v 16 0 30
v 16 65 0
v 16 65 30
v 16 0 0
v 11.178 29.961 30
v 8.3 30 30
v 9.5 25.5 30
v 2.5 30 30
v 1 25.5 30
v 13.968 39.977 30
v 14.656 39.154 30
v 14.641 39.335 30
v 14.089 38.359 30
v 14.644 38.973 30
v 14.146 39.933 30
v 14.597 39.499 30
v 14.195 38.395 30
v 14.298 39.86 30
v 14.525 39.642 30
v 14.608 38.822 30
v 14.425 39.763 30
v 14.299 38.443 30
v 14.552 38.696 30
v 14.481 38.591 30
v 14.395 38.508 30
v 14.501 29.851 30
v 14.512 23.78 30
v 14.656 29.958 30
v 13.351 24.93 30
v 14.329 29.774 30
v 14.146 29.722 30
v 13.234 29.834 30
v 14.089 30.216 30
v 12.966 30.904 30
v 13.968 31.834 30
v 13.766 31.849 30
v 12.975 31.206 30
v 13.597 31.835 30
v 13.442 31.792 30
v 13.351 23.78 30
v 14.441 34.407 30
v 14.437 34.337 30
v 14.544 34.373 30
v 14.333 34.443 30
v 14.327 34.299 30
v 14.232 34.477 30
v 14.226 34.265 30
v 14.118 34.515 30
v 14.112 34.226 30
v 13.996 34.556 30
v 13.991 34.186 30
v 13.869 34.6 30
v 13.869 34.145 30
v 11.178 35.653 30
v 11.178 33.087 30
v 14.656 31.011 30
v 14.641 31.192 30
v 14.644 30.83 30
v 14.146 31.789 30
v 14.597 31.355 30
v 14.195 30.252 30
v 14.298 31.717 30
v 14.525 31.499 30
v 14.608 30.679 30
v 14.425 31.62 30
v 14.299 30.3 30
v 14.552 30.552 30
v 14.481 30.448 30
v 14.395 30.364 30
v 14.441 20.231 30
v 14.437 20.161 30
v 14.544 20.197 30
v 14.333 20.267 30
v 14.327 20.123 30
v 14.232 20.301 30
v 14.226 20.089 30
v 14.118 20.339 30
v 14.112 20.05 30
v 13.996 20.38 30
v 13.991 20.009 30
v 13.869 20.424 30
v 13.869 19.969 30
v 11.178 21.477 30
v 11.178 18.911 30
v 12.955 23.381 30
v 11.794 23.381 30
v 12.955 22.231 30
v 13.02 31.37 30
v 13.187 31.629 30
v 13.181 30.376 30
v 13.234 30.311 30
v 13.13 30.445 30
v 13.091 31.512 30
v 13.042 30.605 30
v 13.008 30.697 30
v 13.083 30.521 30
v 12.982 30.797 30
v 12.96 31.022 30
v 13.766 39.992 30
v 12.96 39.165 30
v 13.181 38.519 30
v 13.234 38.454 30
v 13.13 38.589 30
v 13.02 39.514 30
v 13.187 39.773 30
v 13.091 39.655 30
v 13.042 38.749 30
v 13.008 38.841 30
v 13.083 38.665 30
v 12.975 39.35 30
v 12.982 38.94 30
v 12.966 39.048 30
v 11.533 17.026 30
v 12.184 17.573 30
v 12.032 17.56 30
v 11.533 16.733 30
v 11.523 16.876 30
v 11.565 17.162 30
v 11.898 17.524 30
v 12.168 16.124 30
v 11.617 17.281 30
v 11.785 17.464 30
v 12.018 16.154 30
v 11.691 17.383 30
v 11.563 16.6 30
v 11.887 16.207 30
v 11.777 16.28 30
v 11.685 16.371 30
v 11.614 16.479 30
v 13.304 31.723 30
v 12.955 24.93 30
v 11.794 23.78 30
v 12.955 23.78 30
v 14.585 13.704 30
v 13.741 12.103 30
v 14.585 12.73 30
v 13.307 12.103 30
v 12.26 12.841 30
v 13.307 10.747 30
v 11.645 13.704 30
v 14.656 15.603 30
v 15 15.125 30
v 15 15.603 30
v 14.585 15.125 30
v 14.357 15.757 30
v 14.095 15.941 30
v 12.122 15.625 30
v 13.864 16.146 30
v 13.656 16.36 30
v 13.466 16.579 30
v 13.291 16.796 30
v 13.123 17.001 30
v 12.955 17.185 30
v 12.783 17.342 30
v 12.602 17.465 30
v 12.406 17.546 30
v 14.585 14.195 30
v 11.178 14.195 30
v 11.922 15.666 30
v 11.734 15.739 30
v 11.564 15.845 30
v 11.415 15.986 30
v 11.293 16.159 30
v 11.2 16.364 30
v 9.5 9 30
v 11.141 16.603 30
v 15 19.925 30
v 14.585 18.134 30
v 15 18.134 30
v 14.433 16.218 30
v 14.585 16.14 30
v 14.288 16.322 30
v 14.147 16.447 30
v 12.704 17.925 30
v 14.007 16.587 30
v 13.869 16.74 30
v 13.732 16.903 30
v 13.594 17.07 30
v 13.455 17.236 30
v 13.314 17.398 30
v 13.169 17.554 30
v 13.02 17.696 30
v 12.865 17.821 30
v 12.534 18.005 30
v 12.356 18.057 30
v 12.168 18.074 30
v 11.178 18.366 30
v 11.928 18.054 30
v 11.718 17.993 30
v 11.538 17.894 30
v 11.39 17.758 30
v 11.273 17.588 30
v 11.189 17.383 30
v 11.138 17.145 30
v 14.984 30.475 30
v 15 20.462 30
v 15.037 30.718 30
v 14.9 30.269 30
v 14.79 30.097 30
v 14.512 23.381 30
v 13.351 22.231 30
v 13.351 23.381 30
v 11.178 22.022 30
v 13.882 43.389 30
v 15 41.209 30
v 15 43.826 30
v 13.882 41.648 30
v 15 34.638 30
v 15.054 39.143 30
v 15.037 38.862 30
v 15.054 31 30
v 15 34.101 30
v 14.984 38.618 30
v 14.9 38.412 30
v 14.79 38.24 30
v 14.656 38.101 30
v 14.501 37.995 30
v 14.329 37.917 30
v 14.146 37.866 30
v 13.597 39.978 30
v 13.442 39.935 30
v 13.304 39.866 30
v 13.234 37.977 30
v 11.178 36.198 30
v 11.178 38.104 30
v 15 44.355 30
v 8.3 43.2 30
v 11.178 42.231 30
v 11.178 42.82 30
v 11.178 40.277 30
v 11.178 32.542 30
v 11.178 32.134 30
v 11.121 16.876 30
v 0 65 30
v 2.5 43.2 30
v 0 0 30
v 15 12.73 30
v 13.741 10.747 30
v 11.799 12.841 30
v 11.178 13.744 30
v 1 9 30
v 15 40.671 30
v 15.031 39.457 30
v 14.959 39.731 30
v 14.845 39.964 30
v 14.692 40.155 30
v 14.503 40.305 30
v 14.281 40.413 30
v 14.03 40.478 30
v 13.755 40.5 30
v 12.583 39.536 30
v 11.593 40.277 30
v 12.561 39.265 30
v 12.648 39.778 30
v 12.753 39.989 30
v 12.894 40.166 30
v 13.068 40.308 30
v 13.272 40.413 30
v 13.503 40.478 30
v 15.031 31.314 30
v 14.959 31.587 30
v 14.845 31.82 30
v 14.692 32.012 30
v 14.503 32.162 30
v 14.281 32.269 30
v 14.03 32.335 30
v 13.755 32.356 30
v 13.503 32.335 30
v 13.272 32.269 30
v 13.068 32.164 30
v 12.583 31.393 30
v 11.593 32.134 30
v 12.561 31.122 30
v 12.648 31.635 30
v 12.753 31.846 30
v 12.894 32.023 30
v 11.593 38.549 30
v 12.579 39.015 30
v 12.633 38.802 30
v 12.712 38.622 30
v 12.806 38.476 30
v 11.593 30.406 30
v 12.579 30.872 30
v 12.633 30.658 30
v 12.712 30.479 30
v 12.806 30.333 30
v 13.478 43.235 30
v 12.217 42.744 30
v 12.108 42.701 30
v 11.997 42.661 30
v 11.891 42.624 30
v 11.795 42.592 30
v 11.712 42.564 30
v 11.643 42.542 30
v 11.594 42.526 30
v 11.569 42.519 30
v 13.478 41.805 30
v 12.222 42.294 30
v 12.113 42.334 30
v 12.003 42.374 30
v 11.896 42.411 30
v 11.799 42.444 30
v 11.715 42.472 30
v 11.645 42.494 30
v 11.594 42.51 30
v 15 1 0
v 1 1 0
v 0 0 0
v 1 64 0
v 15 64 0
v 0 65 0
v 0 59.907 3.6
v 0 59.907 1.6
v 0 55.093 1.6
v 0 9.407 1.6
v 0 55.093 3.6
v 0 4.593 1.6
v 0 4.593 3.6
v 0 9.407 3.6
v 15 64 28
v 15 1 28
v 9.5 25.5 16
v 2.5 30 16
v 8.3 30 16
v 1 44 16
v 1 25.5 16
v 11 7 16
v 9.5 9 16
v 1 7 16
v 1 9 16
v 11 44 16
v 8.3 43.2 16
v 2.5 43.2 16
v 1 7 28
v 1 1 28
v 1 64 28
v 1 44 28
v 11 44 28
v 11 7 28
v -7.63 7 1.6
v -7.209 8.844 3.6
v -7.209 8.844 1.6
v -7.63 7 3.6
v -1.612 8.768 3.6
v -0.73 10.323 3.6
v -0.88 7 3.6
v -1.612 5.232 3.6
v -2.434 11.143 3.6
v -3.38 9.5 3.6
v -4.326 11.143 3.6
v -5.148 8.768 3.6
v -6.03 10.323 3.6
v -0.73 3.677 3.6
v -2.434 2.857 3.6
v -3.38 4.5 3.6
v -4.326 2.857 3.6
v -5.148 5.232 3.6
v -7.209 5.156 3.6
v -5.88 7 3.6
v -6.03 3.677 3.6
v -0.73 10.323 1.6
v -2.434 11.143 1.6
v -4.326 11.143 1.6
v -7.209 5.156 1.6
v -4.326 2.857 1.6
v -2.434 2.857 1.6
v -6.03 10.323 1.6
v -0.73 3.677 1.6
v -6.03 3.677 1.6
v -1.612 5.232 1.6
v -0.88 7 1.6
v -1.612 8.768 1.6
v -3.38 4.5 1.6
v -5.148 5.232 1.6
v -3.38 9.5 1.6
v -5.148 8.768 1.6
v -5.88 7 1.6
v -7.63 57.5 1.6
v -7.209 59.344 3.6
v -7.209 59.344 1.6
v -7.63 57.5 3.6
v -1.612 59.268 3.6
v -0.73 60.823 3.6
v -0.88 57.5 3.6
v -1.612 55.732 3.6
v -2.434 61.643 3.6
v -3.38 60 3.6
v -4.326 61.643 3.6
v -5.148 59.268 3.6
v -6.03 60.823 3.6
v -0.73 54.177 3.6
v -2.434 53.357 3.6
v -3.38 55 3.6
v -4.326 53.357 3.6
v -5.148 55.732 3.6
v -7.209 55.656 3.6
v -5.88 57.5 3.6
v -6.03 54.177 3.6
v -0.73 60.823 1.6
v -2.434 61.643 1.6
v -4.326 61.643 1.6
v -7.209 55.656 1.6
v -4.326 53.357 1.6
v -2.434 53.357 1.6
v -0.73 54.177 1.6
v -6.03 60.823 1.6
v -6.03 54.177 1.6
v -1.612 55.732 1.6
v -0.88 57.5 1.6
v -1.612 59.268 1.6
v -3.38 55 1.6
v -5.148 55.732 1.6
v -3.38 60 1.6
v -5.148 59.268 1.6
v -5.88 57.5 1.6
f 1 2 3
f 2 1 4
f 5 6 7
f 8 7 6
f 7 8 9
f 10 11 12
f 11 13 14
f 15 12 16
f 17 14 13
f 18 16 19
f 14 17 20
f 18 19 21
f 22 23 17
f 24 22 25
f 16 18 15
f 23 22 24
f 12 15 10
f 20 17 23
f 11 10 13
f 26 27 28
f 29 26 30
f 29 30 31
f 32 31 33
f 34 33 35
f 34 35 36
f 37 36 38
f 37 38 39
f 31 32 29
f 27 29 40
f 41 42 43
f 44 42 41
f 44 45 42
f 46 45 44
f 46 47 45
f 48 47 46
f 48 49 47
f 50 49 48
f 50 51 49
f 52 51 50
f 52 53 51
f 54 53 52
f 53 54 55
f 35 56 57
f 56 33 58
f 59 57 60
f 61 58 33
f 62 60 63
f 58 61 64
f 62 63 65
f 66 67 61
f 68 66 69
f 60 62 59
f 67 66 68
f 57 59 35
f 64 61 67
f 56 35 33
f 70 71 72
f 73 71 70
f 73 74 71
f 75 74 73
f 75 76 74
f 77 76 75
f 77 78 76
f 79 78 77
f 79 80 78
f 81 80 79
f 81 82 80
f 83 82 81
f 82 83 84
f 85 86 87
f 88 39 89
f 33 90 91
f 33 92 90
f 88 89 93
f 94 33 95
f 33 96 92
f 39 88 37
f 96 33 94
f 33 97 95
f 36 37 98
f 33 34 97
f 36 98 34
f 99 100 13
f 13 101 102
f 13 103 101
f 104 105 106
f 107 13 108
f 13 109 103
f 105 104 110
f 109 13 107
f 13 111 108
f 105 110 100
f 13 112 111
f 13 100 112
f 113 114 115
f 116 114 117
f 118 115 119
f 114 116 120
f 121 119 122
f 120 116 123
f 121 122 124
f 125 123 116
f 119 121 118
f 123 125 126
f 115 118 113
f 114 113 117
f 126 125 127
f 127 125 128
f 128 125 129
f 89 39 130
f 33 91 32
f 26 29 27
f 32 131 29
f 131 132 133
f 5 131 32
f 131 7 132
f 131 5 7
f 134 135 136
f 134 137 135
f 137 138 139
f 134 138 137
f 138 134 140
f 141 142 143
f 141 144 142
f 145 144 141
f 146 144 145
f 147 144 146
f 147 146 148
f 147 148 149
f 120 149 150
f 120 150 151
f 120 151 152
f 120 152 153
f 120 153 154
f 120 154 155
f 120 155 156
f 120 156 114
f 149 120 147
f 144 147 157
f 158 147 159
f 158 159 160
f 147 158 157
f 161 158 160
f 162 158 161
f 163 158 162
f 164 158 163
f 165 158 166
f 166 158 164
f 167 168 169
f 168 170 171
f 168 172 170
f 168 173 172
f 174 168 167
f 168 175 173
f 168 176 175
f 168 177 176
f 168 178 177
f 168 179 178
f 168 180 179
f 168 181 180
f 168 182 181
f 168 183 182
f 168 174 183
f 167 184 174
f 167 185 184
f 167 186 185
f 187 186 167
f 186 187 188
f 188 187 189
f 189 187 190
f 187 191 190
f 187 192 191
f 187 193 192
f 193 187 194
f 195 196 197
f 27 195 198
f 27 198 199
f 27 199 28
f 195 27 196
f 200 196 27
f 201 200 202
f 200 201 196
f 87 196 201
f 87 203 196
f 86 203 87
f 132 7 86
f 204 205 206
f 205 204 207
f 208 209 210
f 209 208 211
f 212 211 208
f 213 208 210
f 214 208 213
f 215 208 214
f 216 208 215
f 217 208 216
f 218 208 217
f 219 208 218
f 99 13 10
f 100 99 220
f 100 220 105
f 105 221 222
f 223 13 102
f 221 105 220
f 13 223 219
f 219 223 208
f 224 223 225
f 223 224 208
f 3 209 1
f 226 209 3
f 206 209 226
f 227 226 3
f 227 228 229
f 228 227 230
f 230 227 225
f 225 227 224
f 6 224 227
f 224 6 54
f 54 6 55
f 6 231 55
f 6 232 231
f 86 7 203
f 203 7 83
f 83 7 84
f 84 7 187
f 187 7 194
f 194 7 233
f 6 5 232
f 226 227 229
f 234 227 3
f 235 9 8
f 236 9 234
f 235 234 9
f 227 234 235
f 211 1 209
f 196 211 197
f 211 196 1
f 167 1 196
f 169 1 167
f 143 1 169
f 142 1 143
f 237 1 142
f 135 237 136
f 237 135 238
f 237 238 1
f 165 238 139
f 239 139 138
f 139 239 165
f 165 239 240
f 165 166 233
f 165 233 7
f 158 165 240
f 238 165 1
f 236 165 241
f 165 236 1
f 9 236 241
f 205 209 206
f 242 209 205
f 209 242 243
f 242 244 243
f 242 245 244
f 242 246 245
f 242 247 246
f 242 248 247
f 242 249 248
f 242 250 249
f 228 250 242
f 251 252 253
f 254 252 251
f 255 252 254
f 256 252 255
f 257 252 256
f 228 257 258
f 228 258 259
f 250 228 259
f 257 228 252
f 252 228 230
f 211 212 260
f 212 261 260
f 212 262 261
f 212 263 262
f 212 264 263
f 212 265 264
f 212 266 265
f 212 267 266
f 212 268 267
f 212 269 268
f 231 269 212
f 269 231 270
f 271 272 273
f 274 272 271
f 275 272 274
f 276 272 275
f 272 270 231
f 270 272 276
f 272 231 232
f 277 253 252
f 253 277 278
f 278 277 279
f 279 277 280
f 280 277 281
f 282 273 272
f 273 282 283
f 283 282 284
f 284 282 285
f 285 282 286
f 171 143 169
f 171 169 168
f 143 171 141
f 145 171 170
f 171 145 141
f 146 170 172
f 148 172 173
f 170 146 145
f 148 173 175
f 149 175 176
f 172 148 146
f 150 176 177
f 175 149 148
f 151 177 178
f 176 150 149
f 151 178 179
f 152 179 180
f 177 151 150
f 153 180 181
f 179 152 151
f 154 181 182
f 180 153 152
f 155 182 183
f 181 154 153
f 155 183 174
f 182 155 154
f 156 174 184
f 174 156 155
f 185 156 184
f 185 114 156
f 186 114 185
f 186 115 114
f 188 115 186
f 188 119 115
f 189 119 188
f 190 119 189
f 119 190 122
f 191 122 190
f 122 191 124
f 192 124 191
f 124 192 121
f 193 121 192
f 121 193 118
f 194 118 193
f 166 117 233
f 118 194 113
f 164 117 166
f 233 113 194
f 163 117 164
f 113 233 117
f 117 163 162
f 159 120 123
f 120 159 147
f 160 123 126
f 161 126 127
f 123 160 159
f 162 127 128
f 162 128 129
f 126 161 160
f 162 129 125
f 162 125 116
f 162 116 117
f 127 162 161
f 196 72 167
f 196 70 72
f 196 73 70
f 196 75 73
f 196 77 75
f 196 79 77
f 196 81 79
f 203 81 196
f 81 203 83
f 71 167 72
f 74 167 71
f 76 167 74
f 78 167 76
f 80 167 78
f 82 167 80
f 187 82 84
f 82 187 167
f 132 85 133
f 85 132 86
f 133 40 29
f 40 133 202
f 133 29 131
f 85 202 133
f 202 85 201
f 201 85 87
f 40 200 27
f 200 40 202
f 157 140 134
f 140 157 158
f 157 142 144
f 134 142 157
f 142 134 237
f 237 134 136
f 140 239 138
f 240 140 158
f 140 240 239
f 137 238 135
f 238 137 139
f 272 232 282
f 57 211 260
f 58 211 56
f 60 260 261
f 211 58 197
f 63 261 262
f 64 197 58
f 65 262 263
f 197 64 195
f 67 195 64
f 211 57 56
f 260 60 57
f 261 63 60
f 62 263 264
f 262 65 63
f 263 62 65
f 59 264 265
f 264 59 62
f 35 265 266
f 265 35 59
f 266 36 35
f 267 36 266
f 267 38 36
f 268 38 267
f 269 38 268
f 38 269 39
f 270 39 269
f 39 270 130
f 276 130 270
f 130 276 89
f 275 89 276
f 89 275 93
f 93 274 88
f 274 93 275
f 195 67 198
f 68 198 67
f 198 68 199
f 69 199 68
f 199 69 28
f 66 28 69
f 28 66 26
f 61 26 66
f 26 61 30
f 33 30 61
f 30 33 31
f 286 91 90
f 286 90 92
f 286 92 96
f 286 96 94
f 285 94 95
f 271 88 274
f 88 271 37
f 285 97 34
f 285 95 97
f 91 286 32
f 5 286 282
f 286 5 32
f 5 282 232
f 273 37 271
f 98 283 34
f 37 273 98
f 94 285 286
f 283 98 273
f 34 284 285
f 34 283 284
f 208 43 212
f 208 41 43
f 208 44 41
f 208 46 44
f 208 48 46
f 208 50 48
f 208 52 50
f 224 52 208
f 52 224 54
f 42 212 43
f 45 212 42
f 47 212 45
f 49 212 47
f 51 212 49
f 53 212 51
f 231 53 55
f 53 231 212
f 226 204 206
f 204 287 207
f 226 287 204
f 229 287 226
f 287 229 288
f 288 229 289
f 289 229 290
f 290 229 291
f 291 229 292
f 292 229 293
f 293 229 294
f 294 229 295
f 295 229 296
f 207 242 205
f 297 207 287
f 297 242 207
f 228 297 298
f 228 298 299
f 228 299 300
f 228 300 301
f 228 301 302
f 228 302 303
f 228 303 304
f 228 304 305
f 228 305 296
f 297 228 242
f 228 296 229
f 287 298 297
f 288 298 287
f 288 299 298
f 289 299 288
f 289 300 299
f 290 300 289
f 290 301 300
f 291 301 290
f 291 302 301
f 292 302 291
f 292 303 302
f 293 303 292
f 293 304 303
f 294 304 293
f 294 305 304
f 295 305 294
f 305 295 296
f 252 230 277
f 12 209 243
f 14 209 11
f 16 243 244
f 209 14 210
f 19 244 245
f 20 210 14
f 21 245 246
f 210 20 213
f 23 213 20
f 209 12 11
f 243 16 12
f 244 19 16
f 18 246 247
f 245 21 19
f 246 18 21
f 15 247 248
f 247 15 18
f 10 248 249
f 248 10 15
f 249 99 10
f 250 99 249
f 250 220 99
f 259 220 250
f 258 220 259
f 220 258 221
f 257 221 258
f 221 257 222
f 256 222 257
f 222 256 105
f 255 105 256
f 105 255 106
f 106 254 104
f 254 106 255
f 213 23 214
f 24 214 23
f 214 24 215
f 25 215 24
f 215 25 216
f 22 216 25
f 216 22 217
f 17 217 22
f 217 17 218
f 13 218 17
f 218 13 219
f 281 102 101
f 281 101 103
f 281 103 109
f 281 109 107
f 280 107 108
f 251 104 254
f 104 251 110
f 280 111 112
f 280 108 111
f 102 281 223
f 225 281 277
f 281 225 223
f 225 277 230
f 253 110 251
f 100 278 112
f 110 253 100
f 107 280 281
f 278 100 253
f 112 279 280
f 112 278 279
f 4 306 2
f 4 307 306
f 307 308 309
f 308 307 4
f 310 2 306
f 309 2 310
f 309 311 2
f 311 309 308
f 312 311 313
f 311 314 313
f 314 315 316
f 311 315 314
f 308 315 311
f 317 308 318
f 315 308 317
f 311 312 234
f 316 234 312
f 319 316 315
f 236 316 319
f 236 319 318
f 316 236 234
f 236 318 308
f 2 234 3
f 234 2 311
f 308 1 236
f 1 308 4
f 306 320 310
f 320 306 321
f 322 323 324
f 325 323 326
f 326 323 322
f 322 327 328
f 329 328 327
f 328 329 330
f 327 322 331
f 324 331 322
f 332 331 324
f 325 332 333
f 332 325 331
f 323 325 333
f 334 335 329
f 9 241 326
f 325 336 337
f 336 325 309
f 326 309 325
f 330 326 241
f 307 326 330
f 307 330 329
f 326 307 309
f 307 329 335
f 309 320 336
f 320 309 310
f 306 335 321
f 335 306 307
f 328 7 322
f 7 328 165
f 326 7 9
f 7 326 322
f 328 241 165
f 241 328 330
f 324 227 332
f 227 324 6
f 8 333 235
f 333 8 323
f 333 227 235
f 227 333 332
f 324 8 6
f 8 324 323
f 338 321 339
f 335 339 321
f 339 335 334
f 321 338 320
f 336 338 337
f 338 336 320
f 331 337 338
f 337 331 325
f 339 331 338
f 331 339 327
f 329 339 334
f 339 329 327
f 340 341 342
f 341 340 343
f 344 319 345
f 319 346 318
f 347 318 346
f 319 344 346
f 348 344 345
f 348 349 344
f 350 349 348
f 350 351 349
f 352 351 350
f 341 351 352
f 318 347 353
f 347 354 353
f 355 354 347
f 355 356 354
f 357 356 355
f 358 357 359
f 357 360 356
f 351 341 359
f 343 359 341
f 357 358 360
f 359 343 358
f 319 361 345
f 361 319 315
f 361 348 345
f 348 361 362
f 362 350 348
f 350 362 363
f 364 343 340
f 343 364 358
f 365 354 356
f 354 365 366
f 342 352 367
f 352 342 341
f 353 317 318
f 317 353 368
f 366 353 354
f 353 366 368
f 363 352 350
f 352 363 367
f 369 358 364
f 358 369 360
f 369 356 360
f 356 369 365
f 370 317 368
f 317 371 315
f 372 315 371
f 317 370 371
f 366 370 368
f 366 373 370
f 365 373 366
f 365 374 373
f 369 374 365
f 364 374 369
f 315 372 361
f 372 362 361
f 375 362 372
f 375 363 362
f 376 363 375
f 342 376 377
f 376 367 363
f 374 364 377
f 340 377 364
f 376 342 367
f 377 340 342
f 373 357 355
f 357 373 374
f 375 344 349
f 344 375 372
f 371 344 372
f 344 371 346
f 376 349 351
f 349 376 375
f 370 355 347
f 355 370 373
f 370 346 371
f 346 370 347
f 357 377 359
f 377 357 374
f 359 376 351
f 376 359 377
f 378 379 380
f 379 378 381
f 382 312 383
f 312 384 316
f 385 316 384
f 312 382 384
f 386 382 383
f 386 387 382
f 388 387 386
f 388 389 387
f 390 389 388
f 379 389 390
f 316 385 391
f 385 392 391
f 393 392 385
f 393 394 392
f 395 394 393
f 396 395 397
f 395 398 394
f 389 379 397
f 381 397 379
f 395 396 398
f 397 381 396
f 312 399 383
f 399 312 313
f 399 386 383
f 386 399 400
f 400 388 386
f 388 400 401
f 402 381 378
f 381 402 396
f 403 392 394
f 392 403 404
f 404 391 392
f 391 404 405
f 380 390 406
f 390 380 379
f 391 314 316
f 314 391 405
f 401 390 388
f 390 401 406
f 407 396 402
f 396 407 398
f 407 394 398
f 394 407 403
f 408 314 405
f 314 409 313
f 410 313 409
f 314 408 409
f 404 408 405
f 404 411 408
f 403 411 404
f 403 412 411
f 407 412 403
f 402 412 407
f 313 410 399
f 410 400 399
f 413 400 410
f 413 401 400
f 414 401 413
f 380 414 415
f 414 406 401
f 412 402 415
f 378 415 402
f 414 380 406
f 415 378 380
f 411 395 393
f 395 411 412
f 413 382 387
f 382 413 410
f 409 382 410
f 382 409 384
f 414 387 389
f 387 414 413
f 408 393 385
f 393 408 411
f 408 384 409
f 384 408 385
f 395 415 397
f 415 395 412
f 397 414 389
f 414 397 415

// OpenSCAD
/*  
    Written by Hendrik Schreutelkamp <info@schreutelkamp.net>   
    This is a housing for a 12V and 5V mod* for a HP PS 3381 1C1 powersupply using xt60 connector an USB port.
    To the extent possible under law, the author(s) have dedicated all
    copyright and related and neighboring rights to this software to the
    public domain worldwide. This software is distributed without any
    warranty.

    You should have received a copy of the CC0 Public Domain
    Dedication along with this software.
    If not, see <http://creativecommons.org/publicdomain/zero/1.0/>.
    
  
*/

difference() {
//main case
cube([16,65,30]);
    translate([1,1,0])cube([14,63,16]);
    translate([1,9,0])cube([8.5,16.5,100]);
    translate([2.5,30,0])cube([5.8,13.2,200]);
    translate([1,44,0])cube([14,20,28]);
    translate([11,1,0])cube([4,63,28]);
    translate([1,1,0])cube([14,6,28]);
   
   
    //imprints
    rotate(90,0,0)translate([10.5,-15,30])linear_extrude(1)text( "-12V+", size=4);
rotate(90,0,0)translate([29.5,-15,30])linear_extrude(1)text( "5V 5A", size=4);
    
    
   
    }




//left latch
difference() {
translate([-19.38--16,7,1.6])cylinder(  2, d=8.5  );
    translate([-19.38--16,7,1.6])cylinder(  2, d=5  );
}
//right latch
difference() {
translate([-19.38--16,57.5,1.6])cylinder(  2, d=8.5  );
translate([-19.38--16,57.5,1.6])cylinder(  2, d=5  );
}






    
